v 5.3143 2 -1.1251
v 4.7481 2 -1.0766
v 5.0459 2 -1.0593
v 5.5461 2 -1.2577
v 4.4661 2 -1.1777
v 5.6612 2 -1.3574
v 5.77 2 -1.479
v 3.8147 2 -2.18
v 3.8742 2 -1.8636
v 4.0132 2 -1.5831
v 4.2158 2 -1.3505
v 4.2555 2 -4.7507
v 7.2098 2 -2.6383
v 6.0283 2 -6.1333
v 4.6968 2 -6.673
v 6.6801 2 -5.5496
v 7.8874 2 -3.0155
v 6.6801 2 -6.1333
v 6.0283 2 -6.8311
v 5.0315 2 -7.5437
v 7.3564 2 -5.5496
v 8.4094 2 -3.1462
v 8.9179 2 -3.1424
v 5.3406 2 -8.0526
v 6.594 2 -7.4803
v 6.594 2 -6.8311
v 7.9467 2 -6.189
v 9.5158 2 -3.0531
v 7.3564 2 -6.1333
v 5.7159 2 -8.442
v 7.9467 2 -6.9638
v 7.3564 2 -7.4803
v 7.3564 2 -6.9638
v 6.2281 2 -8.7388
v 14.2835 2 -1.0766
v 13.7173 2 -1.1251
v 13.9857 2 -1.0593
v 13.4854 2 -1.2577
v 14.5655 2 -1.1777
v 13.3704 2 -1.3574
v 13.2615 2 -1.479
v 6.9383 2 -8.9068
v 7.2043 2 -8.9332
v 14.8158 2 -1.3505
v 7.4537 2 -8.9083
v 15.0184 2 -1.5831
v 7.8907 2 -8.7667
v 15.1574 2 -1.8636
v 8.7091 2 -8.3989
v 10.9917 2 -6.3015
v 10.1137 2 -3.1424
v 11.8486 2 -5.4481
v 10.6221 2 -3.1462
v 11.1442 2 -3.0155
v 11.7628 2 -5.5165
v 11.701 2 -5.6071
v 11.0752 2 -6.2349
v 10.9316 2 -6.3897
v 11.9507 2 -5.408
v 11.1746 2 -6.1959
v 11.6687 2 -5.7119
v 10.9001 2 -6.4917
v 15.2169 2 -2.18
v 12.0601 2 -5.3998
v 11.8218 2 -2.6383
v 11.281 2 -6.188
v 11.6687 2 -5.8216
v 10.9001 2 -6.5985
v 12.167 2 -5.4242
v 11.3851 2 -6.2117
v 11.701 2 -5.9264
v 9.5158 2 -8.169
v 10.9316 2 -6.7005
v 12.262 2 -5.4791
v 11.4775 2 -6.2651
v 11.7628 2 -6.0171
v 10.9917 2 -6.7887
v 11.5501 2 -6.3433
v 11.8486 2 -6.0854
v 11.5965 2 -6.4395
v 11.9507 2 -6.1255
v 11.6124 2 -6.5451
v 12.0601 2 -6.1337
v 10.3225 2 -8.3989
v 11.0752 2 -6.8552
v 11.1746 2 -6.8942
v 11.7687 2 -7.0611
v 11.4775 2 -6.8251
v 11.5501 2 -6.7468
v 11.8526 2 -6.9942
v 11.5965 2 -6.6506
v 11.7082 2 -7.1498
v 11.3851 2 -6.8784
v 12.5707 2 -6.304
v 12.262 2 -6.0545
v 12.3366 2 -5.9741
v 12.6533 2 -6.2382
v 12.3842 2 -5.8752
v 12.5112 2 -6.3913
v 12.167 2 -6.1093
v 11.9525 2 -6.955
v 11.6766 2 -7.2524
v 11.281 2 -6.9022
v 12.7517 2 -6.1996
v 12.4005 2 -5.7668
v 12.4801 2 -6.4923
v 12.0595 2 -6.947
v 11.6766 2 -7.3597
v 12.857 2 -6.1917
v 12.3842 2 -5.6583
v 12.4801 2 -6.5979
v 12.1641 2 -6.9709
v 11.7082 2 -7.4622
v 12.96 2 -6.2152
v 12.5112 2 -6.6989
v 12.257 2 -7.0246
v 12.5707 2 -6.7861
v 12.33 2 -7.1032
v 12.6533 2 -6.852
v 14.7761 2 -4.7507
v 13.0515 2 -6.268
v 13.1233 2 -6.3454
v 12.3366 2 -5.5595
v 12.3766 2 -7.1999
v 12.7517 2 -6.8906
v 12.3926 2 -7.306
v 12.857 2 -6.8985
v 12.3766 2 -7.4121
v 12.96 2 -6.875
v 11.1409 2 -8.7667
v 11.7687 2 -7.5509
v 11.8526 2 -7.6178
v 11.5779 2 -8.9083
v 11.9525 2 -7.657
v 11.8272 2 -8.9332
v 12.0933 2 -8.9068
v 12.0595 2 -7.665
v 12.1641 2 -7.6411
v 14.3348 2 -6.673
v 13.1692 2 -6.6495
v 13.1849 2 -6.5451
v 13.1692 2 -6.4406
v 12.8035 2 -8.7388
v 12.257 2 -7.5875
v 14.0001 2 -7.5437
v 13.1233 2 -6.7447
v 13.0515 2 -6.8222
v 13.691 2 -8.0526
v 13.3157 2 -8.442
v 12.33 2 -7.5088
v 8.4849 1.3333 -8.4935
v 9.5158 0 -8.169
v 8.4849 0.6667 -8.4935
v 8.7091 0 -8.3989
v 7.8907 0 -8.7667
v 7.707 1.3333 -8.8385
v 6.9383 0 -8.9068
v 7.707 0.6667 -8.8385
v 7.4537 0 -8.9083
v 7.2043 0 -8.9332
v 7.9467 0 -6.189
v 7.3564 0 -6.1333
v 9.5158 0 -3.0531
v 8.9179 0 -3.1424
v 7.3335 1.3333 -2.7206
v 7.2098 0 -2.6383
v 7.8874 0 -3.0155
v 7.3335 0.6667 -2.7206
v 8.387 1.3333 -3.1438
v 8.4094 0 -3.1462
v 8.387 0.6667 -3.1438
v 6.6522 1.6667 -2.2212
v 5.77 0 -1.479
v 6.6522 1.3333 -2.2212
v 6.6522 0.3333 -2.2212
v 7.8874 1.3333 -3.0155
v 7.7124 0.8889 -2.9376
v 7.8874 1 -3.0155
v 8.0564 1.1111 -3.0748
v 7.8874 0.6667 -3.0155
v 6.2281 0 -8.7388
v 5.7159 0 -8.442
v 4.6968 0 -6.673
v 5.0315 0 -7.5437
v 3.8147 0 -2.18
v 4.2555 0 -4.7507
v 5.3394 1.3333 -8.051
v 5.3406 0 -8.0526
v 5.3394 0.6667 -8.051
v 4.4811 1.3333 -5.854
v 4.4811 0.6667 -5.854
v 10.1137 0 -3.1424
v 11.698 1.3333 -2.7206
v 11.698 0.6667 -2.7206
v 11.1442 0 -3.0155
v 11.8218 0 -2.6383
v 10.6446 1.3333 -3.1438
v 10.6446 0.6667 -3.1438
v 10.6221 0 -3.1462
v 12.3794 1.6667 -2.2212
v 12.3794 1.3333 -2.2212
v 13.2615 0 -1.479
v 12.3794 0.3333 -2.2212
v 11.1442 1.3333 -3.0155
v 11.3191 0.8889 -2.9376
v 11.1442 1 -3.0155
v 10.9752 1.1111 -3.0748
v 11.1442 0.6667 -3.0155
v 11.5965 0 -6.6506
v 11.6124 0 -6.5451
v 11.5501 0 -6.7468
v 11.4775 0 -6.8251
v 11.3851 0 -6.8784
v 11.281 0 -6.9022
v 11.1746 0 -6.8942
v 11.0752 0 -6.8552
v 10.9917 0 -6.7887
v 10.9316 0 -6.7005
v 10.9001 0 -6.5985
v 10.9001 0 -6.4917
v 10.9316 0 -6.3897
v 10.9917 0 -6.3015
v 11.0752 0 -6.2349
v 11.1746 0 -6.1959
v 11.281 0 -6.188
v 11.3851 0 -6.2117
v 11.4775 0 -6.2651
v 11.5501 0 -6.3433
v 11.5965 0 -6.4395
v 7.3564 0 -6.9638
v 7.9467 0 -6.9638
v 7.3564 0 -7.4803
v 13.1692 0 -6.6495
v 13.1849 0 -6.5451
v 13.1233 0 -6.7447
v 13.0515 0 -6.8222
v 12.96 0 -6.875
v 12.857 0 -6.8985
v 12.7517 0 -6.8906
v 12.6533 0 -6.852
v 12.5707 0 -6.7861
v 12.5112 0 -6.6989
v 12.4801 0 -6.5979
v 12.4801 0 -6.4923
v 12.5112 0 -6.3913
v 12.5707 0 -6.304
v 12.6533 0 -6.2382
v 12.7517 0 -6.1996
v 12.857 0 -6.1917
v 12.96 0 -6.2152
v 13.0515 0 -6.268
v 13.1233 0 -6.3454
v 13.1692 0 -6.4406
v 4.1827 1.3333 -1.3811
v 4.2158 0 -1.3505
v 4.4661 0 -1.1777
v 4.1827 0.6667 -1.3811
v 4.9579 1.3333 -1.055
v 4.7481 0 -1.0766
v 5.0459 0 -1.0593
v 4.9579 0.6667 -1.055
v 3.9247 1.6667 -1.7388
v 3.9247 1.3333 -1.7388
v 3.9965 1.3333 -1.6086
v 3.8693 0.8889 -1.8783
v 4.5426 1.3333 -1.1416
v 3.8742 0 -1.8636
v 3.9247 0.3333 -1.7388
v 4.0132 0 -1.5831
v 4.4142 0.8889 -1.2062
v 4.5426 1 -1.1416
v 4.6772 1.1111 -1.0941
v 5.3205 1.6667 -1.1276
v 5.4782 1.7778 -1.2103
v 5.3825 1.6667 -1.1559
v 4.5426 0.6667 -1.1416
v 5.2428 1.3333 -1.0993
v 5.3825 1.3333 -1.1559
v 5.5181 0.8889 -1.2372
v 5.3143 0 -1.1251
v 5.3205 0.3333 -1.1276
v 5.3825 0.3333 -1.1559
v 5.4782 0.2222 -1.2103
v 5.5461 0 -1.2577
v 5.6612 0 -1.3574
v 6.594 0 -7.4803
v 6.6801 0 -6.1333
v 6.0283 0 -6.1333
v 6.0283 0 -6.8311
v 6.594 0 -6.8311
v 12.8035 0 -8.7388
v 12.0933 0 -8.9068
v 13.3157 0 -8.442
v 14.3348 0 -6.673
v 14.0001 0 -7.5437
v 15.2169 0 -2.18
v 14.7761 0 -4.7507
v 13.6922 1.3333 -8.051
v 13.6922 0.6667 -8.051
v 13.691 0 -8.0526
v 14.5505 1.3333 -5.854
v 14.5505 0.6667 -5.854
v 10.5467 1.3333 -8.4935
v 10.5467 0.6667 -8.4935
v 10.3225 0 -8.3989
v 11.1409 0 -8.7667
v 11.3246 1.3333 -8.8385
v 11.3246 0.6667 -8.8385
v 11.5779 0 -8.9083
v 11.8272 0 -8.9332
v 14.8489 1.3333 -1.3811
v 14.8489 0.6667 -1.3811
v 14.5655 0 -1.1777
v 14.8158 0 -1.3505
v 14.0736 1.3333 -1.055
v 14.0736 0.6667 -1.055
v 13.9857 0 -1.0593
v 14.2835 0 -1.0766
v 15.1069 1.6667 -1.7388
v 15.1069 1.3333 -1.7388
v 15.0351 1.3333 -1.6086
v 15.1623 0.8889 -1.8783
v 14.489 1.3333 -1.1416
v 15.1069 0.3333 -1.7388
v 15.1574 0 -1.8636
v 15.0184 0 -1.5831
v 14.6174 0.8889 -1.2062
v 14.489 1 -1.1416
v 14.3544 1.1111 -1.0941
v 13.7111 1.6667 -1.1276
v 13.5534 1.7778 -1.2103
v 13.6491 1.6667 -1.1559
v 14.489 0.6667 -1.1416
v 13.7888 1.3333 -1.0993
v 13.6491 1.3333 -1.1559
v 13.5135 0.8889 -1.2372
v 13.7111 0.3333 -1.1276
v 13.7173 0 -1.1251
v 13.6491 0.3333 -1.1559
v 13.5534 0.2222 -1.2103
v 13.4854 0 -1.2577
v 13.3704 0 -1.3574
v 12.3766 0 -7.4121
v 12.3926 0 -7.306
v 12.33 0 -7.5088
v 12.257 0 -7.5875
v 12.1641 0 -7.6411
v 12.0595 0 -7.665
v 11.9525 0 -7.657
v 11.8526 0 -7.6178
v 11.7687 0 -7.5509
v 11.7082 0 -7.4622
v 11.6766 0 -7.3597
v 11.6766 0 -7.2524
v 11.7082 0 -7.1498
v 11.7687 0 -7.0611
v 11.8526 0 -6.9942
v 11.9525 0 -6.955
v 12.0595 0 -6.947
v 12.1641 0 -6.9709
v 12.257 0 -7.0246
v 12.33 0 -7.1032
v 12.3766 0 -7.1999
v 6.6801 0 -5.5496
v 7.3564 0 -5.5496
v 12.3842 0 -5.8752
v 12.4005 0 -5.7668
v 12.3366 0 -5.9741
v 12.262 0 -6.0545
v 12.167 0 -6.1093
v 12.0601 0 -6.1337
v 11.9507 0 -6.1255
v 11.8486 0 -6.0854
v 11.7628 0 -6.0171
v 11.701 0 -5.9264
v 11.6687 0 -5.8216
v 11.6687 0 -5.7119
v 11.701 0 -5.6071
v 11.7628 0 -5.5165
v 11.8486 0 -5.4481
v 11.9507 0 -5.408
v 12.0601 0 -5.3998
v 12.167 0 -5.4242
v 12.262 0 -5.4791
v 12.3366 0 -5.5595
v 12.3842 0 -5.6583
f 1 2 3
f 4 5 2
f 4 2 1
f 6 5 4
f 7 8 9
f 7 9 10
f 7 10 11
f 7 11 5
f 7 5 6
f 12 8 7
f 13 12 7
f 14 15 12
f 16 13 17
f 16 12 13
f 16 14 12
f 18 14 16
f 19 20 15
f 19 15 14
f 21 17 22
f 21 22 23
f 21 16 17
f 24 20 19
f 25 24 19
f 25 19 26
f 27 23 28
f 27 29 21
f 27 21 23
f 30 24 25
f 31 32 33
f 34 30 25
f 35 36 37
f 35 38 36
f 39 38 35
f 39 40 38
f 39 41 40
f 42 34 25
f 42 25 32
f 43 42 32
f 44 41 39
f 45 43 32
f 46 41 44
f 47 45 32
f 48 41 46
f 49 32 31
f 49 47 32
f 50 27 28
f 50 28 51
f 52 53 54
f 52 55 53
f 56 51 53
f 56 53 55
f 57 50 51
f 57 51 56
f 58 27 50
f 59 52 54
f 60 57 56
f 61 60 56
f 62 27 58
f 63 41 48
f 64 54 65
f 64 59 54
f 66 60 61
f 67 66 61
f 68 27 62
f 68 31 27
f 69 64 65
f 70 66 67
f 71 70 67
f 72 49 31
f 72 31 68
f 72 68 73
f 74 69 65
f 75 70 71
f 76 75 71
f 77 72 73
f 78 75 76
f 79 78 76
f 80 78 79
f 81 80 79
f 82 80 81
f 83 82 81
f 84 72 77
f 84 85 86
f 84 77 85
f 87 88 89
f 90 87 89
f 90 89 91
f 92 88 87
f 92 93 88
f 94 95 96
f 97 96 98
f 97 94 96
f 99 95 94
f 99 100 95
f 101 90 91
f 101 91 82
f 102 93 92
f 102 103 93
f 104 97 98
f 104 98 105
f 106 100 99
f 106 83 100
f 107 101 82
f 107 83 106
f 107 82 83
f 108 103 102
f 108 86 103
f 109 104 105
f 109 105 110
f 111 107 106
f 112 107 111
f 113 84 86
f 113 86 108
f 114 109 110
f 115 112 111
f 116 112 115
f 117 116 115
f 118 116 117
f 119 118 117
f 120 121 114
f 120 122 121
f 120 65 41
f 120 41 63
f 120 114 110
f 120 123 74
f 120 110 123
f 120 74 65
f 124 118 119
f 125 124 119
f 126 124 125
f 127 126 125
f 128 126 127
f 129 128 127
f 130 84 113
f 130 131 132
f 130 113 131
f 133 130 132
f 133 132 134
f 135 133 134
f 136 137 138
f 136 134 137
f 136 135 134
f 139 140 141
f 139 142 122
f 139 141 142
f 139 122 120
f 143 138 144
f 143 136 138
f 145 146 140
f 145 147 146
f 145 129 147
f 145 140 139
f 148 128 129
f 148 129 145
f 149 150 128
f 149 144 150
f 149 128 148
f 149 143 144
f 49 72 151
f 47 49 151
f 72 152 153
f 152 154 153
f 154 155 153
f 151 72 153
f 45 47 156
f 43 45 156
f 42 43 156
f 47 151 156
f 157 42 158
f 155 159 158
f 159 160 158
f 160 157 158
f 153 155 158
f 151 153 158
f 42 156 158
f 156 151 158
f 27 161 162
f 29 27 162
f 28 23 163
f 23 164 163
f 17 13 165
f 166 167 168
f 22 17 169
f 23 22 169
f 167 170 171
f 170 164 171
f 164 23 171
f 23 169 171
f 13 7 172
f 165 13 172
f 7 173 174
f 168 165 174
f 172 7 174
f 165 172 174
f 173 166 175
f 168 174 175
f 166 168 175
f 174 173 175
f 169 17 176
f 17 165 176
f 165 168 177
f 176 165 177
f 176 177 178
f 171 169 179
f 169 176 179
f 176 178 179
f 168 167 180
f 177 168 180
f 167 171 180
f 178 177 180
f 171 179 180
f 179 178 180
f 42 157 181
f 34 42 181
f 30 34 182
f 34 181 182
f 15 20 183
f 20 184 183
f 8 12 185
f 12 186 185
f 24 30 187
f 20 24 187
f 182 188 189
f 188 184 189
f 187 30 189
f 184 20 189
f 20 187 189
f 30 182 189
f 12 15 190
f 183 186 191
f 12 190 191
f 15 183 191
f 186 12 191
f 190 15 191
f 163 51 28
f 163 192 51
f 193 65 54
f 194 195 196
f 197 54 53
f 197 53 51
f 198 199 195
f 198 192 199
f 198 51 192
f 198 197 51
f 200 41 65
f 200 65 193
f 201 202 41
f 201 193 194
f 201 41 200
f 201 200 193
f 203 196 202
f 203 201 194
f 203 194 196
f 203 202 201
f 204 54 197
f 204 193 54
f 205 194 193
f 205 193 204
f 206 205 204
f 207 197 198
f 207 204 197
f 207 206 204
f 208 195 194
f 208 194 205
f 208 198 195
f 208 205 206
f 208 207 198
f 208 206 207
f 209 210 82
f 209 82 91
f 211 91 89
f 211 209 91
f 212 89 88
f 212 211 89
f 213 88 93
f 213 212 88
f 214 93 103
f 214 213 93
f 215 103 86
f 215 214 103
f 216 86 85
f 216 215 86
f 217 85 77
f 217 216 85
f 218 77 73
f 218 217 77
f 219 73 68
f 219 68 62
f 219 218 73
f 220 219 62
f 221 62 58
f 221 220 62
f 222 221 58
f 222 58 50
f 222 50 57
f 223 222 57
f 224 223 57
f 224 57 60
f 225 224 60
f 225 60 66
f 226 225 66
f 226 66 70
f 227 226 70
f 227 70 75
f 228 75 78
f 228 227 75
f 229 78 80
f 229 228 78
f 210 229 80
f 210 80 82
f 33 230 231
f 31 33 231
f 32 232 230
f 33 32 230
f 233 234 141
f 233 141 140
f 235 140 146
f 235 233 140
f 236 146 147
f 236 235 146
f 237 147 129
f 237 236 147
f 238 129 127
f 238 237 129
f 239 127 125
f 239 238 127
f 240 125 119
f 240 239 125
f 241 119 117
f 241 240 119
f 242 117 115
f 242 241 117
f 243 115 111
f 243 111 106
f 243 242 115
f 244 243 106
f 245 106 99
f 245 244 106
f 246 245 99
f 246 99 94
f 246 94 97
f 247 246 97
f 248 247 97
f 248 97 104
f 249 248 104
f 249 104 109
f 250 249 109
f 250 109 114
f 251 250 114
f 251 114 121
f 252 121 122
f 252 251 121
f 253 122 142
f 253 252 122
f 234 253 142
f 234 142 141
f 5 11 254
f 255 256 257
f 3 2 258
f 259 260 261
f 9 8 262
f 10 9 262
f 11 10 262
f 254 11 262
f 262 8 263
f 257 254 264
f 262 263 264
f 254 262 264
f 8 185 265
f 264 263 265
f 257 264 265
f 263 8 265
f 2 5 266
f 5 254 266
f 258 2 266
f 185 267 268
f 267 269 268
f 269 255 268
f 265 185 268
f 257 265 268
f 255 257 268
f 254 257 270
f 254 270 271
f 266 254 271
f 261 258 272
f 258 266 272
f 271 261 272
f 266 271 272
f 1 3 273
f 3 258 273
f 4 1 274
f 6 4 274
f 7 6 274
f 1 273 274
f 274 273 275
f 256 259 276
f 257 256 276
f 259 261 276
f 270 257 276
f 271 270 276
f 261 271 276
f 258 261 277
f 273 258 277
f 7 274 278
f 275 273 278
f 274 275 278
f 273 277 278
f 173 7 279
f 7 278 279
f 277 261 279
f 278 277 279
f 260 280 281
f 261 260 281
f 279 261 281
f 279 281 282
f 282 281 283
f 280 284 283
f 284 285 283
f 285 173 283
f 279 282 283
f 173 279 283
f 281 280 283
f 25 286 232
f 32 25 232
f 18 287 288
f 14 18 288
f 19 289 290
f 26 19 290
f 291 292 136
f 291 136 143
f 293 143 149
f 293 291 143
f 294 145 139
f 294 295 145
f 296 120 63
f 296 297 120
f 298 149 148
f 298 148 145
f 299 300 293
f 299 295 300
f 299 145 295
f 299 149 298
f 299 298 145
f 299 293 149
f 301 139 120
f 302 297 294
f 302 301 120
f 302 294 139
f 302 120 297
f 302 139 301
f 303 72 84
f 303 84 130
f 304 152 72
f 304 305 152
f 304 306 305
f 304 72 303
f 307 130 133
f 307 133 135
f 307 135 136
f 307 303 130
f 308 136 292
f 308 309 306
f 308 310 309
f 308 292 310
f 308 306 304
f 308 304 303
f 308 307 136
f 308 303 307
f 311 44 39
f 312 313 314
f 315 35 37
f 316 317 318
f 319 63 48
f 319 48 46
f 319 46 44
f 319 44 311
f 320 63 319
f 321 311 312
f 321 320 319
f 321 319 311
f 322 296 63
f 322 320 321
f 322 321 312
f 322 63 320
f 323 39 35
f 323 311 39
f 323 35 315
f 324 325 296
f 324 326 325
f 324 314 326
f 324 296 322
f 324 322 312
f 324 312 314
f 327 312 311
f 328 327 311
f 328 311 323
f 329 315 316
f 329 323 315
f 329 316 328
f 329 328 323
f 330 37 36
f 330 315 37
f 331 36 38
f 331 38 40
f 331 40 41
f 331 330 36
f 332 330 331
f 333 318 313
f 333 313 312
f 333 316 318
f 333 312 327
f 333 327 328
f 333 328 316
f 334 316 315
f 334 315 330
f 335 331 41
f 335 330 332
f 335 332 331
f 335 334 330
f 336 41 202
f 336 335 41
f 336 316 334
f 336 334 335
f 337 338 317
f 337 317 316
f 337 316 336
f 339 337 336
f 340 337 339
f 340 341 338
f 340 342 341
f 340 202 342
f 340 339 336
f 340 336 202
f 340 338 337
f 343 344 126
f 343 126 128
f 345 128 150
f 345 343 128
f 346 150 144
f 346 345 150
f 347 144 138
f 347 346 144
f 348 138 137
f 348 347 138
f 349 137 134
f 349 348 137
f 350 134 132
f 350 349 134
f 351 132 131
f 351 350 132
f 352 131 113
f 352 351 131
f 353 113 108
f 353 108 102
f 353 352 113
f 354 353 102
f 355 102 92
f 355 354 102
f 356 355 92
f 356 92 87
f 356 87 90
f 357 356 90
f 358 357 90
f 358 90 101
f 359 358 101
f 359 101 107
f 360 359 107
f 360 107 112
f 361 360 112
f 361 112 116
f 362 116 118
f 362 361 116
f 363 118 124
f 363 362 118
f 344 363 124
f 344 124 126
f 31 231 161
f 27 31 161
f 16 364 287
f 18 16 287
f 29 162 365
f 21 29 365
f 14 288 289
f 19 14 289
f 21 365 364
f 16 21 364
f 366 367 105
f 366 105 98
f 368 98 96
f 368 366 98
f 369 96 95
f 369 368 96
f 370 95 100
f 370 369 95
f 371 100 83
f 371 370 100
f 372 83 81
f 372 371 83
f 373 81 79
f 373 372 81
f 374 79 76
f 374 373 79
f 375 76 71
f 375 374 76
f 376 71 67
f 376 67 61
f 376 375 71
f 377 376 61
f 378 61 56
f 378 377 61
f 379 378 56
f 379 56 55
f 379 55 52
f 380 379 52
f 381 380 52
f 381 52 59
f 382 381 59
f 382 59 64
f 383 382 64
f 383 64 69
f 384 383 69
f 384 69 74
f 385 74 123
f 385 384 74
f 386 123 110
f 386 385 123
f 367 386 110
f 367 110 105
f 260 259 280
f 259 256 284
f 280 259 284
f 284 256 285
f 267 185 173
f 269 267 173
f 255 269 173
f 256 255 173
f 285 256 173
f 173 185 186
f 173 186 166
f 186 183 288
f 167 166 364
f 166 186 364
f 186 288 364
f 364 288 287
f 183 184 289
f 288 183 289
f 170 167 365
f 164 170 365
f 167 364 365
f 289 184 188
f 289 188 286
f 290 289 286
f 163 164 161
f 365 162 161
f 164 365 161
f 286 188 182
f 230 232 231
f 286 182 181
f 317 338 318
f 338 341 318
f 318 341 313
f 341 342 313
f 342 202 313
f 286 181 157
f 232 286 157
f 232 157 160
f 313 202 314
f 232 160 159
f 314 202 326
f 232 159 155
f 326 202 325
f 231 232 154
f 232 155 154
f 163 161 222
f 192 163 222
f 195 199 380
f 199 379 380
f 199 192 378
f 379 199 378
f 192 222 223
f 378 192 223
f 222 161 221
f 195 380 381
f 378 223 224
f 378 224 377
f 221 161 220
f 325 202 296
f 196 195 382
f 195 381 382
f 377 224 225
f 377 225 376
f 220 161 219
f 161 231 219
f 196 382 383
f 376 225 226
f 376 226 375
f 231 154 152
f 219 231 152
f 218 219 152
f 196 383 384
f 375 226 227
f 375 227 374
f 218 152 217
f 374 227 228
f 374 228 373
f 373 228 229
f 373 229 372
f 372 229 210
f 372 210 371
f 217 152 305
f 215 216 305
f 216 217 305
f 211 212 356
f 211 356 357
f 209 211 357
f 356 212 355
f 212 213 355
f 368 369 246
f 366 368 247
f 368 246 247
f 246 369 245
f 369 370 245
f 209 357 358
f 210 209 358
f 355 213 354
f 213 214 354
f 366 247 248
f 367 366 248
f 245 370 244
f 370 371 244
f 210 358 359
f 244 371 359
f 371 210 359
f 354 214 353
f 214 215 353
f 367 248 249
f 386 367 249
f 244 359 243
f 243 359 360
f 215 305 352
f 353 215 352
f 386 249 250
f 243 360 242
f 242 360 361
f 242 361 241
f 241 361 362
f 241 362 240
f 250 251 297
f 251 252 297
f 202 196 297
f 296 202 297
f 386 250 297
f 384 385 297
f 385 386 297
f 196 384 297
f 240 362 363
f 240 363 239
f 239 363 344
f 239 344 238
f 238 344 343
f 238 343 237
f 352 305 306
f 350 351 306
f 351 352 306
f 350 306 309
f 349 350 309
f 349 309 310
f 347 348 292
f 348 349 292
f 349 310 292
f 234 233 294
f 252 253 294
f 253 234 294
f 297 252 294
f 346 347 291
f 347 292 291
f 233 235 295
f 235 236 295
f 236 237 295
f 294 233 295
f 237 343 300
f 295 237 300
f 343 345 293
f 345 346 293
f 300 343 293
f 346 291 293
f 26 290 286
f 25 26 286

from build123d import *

# Parameters (mm, degrees)
SKETCH1_R           = 0.358119717
SKETCH1_R_2         = 0.367977628
SKETCH1_R_3         = 0.354400667
SKETCH1_R_4         = 0.360009999
BOSS_EXTRUDE1_DEPTH = 2


with BuildPart() as part:
    # Sketch1 → Boss-Extrude1 (new body)
    with BuildSketch(Plane(origin=(0, 0, 0), x_dir=(1, 0, 0), z_dir=(0, 1, 0))):
        with BuildLine():
            add(Edge.make_bspline(
                [(9.515794057, 8.168972603), (8.277051231, 8.384166889), (7.783662178, 9.075903216), (6.938322746, 8.906835329)],
                knots=[0, 0, 0, 0, 1, 1, 1, 1], degree=3))
            add(Edge.make_bspline(
                [(6.938322746, 8.906835329), (4.786223752, 8.676253294), (4.567934499, 6.637882364), (3.814703871, 2.179986806)],
                knots=[0, 0, 0, 0, 1, 1, 1, 1], degree=3))
            add(Edge.make_bspline(
                [(3.814703871, 2.179986806), (3.85569383, 1.237217744), (5.062947097, 0.587465173), (5.770040096, 1.479017216)],
                knots=[0, 0, 0, 0, 1, 1, 1, 1], degree=3))
            add(Edge.make_bspline(
                [(5.770040096, 1.479017216), (7.783771597, 3.231424782), (8.154064913, 3.299063972), (9.515794057, 3.053124366)],
                knots=[0, 0, 0, 0, 1, 1, 1, 1], degree=3))
            add(Edge.make_bspline(
                [(13.261548017, 1.479017216), (11.247816516, 3.231424782), (10.8775232, 3.299063972), (9.515794057, 3.053124366)],
                knots=[0, 0, 0, 0, 1, 1, 1, 1], degree=3))
            add(Edge.make_bspline(
                [(15.216884243, 2.179986806), (15.175894283, 1.237217744), (13.968641017, 0.587465173), (13.261548017, 1.479017216)],
                knots=[0, 0, 0, 0, 1, 1, 1, 1], degree=3))
            add(Edge.make_bspline(
                [(12.093265367, 8.906835329), (14.245364361, 8.676253294), (14.463653614, 6.637882364), (15.216884243, 2.179986806)],
                knots=[0, 0, 0, 0, 1, 1, 1, 1], degree=3))
            add(Edge.make_bspline(
                [(9.515794057, 8.168972603), (10.754536882, 8.384166889), (11.247925935, 9.075903216), (12.093265367, 8.906835329)],
                knots=[0, 0, 0, 0, 1, 1, 1, 1], degree=3))
        make_face()
        with Locations((11.254257148, 6.545084301)):
            Circle(SKETCH1_R, mode=Mode.SUBTRACT)
        with Locations((12.032572113, 5.766769337)):
            Circle(SKETCH1_R_2, mode=Mode.SUBTRACT)
        with Locations((12.830512487, 6.545084301)):
            Circle(SKETCH1_R_3, mode=Mode.SUBTRACT)
        with Locations((12.032572113, 7.306018511)):
            Circle(SKETCH1_R_4, mode=Mode.SUBTRACT)
        Polygon((6.680070792, 7.480300725), (7.356444958, 7.480300725), (7.356444958, 6.963796816), (7.946735139, 6.963796816), (7.946735139, 6.189040953), (7.356444958, 6.133334516), (7.356444958, 5.549559924), (6.680070792, 5.549559924), (6.680070792, 6.133334516), (6.02829205, 6.133334516), (6.02829205, 6.831056674), (6.593986807, 6.831056674), (6.593986807, 7.480300725), align=None, mode=Mode.SUBTRACT)
    extrude(amount=BOSS_EXTRUDE1_DEPTH)


solid = part.part
